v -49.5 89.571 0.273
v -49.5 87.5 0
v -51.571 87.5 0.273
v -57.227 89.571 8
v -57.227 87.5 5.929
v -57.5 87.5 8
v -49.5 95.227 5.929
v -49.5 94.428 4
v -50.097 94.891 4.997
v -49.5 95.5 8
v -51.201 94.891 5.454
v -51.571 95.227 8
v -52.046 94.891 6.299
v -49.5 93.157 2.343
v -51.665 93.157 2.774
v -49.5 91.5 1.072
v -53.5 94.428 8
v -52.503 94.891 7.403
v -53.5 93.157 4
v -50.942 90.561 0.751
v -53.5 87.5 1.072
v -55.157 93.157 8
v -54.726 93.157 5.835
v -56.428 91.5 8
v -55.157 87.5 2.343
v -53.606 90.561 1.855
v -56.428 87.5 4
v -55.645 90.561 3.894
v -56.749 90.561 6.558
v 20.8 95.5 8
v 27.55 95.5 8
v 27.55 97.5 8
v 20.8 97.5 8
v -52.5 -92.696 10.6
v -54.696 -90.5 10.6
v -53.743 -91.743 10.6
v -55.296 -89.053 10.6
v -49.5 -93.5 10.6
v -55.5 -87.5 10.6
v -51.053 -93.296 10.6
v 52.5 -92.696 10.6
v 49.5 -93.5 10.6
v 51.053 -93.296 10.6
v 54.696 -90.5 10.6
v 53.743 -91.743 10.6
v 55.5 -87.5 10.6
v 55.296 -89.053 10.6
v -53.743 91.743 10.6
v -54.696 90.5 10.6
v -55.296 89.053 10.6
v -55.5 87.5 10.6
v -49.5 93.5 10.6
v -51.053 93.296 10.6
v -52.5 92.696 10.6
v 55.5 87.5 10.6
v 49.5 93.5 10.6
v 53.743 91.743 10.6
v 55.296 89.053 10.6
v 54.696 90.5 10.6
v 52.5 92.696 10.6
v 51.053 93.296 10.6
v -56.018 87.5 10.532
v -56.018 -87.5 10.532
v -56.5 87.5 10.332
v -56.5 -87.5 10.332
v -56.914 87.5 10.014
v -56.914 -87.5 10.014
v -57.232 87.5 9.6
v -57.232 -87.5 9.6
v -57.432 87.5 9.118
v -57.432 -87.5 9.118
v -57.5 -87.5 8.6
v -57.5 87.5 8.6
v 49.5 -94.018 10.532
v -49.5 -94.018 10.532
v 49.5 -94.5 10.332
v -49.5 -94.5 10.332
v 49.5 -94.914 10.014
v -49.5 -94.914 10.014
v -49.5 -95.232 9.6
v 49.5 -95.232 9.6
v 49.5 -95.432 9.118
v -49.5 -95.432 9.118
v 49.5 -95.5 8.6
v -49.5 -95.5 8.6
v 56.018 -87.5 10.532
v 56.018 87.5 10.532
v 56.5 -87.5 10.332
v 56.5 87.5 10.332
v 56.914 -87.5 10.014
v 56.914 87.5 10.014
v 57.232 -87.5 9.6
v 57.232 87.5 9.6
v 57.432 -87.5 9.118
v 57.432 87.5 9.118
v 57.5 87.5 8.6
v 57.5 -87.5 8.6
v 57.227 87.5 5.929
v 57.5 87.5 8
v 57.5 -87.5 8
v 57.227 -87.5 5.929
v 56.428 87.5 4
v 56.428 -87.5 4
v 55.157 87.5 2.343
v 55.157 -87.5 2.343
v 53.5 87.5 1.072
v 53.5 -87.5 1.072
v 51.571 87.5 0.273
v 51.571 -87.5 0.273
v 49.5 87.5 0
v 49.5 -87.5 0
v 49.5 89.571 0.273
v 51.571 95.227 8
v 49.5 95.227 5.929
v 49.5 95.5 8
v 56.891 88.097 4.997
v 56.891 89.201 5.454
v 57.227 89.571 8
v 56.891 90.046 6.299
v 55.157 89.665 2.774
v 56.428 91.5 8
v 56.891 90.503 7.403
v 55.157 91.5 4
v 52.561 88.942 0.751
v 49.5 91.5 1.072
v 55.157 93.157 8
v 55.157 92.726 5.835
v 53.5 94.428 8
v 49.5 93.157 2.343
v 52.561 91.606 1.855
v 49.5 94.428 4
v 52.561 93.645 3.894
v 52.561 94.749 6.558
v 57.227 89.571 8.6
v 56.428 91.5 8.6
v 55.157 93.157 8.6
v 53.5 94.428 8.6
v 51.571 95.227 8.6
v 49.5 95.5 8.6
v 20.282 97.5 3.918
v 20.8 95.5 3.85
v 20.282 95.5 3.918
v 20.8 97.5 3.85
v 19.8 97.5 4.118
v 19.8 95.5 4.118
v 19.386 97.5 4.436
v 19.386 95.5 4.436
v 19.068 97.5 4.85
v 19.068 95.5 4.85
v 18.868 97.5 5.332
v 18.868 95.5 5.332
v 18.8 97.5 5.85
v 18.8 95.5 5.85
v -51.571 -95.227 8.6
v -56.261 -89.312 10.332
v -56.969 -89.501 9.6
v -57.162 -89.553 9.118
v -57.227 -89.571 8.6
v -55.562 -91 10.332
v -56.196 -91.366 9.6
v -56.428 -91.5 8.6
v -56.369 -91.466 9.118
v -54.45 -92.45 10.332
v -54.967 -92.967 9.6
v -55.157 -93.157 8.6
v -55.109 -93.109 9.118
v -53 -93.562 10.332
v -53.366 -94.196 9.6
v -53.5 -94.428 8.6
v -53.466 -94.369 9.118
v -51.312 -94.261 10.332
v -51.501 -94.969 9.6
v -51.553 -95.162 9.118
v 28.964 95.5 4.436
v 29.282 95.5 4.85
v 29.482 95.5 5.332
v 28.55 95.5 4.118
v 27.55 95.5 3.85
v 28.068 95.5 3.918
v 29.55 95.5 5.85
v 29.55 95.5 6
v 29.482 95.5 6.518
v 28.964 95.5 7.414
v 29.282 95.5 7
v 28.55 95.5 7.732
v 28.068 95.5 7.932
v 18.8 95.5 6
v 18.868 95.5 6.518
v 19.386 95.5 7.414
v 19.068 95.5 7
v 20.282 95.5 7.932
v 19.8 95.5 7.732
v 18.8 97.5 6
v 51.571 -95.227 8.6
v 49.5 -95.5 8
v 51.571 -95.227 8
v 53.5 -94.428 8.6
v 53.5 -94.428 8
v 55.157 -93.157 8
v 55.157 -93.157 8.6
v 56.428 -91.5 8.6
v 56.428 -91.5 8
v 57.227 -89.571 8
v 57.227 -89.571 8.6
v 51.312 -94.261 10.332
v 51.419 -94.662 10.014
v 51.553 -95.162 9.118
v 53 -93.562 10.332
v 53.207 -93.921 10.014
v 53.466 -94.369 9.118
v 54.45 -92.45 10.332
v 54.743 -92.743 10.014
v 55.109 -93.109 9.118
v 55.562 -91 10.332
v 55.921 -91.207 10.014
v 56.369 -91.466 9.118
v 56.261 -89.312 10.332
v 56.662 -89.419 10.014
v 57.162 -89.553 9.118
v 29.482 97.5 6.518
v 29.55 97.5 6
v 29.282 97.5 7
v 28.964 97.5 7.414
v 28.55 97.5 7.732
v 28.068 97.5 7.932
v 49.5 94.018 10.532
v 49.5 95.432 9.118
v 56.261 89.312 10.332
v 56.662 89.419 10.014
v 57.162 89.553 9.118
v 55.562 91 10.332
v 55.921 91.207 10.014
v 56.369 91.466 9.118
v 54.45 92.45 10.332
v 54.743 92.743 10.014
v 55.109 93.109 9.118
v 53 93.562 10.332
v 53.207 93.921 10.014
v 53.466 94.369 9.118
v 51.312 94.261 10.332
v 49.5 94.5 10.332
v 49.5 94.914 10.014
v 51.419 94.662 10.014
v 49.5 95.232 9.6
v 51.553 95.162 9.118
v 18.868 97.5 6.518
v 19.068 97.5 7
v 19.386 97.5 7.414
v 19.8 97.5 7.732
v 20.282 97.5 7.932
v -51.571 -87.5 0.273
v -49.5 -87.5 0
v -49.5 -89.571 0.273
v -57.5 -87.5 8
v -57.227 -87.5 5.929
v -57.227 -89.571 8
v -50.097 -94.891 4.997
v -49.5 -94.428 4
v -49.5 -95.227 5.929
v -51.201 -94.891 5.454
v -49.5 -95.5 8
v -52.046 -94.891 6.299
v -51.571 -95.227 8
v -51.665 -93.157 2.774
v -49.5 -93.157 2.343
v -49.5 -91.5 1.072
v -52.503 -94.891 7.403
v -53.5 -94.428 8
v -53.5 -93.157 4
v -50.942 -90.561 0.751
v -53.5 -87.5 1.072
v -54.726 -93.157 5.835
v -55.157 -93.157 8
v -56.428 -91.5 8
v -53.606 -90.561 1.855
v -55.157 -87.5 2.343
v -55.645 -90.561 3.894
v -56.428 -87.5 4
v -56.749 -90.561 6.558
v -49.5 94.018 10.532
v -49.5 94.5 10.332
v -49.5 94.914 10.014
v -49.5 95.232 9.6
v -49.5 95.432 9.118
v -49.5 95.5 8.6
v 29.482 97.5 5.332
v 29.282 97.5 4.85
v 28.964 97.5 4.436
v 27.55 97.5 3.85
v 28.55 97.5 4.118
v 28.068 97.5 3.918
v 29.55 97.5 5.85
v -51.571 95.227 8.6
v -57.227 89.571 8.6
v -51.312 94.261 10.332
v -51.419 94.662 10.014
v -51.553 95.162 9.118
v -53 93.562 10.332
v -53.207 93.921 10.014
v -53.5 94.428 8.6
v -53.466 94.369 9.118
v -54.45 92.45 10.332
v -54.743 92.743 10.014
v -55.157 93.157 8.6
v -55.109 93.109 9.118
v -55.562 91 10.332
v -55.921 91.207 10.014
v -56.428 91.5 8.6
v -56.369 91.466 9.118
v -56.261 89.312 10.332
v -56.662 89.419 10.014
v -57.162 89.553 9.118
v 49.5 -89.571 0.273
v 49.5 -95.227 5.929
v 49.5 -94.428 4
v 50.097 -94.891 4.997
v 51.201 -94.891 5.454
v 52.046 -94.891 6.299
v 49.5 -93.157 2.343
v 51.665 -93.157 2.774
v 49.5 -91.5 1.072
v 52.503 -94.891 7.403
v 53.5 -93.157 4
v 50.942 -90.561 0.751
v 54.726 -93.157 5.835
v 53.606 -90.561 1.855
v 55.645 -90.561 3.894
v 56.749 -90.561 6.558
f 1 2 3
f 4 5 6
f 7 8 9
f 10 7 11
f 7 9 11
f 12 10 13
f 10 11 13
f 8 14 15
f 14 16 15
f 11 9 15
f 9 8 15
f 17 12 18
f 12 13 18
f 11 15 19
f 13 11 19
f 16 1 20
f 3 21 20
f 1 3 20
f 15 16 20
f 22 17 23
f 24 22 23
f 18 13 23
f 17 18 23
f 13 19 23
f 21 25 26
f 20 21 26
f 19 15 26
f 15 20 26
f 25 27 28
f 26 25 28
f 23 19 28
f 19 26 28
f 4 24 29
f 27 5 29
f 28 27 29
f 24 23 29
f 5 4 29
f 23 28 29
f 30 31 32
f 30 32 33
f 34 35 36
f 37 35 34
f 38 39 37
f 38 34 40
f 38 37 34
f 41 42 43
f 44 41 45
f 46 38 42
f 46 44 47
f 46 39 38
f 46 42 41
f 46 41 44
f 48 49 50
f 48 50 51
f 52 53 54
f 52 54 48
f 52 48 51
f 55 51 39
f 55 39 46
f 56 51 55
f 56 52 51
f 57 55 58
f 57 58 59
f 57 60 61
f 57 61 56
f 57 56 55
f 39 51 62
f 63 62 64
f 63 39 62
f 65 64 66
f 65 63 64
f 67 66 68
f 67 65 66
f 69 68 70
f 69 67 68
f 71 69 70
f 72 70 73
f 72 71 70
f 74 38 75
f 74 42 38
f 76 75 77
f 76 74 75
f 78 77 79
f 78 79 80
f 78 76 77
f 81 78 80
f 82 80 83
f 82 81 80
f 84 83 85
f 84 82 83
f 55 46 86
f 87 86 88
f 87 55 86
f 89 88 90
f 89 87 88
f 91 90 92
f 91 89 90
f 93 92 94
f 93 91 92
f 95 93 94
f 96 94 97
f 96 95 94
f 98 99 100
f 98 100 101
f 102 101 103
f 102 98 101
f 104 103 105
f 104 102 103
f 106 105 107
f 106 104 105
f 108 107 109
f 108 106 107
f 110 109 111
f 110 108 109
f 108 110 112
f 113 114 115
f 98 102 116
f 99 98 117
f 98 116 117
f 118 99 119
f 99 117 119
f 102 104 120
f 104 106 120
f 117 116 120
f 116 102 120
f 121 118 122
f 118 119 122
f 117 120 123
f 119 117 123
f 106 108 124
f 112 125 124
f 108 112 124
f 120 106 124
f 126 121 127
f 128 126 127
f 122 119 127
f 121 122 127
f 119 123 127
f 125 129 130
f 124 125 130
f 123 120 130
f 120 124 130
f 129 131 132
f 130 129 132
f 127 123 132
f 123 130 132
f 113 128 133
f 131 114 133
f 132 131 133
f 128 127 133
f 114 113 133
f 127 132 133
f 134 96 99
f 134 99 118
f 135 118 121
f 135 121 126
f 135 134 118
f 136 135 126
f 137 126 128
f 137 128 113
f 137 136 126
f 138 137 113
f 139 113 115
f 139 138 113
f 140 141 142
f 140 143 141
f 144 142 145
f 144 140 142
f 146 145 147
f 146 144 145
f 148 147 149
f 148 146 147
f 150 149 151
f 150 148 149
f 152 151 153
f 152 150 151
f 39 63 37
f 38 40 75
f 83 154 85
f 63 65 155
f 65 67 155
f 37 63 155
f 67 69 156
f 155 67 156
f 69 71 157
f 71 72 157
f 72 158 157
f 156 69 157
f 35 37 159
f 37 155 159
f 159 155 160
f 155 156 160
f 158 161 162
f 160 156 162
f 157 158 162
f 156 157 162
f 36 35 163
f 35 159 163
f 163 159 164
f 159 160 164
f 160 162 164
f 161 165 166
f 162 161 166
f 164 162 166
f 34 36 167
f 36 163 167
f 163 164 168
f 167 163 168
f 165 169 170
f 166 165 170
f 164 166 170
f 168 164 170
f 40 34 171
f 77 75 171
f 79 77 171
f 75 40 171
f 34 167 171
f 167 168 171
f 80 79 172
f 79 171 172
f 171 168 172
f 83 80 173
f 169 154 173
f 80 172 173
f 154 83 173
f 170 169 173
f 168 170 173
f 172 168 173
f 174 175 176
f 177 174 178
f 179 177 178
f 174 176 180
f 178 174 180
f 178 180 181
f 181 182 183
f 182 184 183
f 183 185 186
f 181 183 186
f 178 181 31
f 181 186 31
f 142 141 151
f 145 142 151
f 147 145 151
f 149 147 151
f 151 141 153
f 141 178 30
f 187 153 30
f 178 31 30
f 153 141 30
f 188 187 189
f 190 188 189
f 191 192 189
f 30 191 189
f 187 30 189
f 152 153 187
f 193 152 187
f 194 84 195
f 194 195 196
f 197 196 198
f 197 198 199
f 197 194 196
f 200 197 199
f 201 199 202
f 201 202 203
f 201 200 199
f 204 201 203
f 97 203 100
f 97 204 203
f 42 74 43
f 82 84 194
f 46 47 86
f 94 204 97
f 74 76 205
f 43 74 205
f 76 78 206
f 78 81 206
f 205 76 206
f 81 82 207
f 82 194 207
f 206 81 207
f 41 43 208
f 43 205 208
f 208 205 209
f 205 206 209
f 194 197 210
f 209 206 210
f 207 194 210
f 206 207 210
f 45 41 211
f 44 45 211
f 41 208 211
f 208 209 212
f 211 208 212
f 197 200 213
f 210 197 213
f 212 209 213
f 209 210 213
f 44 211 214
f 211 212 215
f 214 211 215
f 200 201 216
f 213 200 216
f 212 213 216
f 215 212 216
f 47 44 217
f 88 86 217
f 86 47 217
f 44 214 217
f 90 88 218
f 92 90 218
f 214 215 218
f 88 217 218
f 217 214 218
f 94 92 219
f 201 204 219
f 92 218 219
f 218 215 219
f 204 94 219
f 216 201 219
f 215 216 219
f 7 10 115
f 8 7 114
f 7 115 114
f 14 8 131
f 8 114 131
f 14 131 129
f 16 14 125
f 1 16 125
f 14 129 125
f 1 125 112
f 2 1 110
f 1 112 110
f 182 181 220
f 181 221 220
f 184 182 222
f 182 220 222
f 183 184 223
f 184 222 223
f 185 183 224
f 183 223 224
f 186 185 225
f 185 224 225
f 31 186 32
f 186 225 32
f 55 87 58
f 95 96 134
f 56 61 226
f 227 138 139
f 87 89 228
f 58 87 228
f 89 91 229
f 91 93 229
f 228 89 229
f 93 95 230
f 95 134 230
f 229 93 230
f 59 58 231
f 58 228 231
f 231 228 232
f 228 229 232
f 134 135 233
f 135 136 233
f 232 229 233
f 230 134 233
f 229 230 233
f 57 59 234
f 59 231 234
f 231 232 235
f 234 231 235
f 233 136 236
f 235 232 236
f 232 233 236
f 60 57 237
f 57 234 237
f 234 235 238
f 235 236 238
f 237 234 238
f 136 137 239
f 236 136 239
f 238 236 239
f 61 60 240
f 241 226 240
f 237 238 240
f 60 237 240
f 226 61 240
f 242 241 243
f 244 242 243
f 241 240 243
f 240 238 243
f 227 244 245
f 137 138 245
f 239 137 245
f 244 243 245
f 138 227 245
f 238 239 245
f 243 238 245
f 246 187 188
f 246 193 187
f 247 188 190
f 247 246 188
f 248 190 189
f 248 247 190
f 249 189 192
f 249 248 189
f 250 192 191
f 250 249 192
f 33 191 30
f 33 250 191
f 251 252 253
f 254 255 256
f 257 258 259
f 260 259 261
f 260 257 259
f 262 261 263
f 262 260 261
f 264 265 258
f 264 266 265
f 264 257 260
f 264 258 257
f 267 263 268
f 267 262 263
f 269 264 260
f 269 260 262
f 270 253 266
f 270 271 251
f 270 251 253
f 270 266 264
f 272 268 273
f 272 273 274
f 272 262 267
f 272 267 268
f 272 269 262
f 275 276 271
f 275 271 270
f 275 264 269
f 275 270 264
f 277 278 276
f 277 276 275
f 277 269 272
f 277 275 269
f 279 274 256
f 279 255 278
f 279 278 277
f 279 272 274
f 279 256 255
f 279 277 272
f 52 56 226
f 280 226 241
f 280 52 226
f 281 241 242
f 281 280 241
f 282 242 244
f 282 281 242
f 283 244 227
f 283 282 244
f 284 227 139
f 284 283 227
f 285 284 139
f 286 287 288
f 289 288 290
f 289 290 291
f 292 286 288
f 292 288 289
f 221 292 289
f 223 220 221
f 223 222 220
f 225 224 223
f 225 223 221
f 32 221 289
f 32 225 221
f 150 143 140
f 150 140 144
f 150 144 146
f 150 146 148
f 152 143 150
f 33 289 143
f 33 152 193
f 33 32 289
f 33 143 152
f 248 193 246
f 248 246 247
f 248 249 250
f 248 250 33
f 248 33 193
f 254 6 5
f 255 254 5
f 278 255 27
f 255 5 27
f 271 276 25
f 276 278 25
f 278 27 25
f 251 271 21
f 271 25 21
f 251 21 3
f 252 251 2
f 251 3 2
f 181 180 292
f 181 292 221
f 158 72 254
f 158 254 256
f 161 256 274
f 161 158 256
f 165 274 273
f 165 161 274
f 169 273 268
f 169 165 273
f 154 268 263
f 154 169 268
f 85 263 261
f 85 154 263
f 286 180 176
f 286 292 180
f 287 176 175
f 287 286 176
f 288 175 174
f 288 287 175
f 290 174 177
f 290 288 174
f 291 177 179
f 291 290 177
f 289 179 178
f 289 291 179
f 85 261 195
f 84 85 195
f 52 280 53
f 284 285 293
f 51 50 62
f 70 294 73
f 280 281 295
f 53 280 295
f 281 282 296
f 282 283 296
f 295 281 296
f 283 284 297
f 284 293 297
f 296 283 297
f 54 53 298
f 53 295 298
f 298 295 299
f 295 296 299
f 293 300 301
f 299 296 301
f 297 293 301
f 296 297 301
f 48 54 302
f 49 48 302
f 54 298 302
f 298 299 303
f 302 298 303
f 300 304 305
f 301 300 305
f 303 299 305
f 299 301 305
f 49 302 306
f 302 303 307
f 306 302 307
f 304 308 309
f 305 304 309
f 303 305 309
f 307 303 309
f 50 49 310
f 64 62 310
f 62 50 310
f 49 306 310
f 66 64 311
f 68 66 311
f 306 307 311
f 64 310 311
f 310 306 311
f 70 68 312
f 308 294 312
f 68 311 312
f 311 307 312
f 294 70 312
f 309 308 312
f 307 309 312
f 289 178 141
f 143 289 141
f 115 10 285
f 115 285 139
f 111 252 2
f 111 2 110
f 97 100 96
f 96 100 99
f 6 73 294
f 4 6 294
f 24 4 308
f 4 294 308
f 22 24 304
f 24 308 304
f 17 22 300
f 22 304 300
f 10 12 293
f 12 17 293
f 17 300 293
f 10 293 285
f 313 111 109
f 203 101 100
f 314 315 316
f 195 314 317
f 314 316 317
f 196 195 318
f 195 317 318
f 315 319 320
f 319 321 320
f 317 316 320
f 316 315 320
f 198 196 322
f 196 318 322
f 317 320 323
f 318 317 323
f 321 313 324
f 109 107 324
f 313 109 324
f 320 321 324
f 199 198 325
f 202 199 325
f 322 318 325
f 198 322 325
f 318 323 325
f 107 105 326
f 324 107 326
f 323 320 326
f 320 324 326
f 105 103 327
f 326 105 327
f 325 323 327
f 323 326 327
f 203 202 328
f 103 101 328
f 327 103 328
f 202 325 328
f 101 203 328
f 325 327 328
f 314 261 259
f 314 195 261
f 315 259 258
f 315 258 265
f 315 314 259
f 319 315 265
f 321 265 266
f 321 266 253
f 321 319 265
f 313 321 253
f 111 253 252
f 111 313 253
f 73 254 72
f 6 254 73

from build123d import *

# Parameters (mm, degrees)
F0_W     = 115
F0_H     = 191
F1_DEPTH = 10.6
F2_R     = 8
F3_R     = 2
F4_W     = 10.75
F4_H     = 4.15
F5_DEPTH = 2
F6_R     = 2


with BuildPart() as f1:
    # F0 (on Top) → F1 (new body)
    with BuildSketch(Plane.XY):
        Rectangle(F0_W, F0_H)
    extrude(amount=F1_DEPTH)

    # F2
    f2_edges = [f1.edges().sort_by_distance(p)[0] for p in [
        (-57.5, 0, 0),
        (0, 95.5, 0),
        (57.5, 0, 0),
        (0, -95.5, 0),
        (-57.5, 95.5, 5.3),
        (57.5, 95.5, 5.3),
        (57.5, -95.5, 5.3),
        (-57.5, -95.5, 5.3),
    ]]
    fillet(f2_edges, radius=F2_R)

    # F3
    f3_edges = [f1.edges().sort_by_distance(p)[0] for p in [
        (0, -95.5, 10.6),
    ]]
    fillet(f3_edges, radius=F3_R)


with BuildPart() as f5:
    # F4 (on face) → F5 (new body)
    with BuildSketch(Plane(origin=(0, 95.5, 0), x_dir=(-1, 0, 0), z_dir=(0, 1, 0))):
        with Locations((-24.175, 5.925)):
            Rectangle(F4_W, F4_H)
    extrude(amount=F5_DEPTH)

    # F6
    f6_edges = [f5.edges().sort_by_distance(p)[0] for p in [
        (18.8, 96.5, 8),
        (18.8, 96.5, 3.85),
        (29.55, 96.5, 3.85),
        (29.55, 96.5, 8),
    ]]
    fillet(f6_edges, radius=F6_R)


solid = Compound([f1.part, f5.part])
